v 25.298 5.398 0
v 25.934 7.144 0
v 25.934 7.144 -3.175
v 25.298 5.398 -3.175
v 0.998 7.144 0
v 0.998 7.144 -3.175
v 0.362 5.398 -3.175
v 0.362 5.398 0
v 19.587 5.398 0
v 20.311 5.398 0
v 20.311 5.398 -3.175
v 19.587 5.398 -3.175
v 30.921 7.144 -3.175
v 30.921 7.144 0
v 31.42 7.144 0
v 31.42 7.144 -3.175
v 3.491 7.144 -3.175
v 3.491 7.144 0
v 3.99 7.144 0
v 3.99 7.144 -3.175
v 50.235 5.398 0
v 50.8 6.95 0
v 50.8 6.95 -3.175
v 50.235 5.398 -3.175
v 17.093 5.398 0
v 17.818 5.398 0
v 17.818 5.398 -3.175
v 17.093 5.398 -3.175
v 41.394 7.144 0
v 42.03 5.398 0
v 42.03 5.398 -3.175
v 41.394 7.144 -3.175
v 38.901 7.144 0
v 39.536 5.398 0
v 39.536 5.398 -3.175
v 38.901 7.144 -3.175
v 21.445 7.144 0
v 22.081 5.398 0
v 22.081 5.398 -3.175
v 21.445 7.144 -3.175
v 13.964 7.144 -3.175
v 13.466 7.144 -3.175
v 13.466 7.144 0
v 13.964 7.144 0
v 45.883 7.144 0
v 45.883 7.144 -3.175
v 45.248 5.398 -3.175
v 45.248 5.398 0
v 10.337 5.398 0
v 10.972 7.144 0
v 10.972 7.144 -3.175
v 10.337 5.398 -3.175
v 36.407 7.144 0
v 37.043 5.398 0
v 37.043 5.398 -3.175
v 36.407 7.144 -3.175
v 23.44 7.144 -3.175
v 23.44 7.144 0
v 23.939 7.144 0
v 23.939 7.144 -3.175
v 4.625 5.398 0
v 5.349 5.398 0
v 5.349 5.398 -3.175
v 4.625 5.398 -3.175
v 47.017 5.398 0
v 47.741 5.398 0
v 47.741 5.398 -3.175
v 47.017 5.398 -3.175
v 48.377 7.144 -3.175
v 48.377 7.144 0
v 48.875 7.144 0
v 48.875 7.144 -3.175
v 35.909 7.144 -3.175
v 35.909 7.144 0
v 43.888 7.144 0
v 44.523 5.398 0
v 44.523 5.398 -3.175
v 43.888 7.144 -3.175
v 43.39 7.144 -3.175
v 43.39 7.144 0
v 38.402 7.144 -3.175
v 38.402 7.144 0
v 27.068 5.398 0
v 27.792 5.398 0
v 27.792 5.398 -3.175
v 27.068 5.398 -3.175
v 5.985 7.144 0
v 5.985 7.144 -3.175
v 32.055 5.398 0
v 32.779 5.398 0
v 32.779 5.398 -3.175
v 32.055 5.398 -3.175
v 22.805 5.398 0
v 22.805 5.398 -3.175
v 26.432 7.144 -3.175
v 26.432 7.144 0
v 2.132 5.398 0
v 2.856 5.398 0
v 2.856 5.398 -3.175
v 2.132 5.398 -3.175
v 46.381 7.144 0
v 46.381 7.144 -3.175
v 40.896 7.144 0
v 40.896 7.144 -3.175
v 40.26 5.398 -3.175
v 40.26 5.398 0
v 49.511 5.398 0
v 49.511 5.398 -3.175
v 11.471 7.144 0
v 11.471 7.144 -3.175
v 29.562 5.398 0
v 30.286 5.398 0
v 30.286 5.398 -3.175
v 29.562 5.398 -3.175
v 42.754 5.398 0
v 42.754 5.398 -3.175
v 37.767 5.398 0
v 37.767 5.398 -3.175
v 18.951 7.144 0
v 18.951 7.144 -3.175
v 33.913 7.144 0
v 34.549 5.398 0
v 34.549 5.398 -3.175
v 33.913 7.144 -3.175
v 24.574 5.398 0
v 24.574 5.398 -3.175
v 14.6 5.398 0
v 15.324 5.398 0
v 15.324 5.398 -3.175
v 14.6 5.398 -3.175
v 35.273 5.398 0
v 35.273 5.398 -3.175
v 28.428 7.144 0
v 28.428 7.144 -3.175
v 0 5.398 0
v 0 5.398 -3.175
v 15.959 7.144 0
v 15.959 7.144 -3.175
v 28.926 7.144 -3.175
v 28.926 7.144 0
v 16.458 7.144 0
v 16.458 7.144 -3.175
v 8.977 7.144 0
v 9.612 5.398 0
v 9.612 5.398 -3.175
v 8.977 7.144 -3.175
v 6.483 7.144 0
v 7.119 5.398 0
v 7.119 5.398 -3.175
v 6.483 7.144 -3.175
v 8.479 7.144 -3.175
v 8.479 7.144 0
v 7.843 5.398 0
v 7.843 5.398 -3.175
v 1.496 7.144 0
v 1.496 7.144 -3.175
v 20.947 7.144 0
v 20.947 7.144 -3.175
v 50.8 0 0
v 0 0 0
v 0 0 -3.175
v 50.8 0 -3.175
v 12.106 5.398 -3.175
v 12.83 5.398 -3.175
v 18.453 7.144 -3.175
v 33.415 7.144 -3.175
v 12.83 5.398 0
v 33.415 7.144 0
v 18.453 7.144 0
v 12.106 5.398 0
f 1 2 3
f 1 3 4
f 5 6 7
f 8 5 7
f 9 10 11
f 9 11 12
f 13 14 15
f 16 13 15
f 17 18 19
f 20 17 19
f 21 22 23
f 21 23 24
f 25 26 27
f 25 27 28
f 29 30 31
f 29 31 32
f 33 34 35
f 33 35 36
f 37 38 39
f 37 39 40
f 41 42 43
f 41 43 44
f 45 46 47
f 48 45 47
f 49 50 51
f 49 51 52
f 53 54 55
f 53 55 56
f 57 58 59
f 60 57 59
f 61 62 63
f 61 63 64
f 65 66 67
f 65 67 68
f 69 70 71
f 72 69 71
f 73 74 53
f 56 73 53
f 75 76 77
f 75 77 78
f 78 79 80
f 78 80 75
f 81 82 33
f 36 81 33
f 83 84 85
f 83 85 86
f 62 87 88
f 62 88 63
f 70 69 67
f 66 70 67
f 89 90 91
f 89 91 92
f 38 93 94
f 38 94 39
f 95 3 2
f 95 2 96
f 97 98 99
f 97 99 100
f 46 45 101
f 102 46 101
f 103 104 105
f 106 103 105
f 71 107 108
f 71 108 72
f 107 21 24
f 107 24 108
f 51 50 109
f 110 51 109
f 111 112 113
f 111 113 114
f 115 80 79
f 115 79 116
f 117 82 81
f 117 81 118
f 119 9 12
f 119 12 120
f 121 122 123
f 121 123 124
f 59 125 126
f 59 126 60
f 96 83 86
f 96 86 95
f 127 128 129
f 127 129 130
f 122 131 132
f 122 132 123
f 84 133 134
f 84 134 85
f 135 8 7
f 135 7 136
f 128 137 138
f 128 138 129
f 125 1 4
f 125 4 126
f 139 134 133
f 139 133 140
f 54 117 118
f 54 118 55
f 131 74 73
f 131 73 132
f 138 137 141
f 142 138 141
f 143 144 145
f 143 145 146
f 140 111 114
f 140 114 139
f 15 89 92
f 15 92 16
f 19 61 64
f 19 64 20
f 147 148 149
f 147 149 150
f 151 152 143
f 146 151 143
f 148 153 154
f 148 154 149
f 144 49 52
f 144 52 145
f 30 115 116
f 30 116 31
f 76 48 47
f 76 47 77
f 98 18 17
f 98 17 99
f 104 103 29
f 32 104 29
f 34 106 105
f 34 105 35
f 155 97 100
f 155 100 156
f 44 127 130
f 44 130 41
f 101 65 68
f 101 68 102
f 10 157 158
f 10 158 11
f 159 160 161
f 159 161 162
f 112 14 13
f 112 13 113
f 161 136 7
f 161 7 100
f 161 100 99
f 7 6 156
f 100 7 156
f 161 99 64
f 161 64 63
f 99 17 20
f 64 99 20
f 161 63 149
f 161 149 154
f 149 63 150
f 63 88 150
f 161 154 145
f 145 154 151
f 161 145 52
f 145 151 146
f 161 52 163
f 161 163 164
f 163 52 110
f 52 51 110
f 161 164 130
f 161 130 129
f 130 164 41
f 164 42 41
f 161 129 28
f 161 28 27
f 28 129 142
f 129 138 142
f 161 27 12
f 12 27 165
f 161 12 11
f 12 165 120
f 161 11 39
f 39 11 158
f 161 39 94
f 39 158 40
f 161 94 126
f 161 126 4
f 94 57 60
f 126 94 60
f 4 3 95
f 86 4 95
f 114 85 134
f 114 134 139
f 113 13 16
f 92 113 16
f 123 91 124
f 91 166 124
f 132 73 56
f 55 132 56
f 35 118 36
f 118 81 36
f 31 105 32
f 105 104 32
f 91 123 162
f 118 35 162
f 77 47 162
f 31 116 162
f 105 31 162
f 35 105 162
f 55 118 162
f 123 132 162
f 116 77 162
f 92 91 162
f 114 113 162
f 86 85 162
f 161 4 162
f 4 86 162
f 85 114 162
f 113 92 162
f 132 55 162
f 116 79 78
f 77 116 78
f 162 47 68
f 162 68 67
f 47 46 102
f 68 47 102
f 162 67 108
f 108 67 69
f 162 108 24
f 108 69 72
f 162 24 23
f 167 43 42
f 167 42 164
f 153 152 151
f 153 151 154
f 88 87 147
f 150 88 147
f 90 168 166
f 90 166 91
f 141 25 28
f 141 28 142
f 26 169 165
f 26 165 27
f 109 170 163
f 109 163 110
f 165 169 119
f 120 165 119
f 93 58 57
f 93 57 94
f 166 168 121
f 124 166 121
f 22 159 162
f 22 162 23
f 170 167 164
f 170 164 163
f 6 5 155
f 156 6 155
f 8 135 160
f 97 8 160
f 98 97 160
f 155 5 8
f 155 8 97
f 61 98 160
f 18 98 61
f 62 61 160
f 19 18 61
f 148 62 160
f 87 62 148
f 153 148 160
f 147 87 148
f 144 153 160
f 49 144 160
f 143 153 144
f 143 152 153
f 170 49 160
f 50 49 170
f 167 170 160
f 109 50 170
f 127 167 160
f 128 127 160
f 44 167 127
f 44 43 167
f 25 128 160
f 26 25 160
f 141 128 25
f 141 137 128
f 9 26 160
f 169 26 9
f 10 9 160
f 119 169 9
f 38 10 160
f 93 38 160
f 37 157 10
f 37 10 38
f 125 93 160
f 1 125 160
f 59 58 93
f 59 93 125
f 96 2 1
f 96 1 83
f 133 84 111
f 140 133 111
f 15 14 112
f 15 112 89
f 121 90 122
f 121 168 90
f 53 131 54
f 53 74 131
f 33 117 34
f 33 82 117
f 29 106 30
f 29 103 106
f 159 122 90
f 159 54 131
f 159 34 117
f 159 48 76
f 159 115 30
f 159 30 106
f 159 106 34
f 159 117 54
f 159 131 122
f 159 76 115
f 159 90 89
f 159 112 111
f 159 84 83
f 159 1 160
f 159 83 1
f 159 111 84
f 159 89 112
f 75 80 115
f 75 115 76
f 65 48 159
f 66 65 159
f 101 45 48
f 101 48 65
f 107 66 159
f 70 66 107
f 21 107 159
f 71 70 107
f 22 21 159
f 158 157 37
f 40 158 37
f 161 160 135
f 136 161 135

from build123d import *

# Parameters (mm, degrees)
BLANKSKE_W        = 50.8
BLANKSKE_H        = 7.14375
BLANK_DEPTH       = 3.175
TOOTHCUTSIM_DEPTH = 52.397994018
TEETHCUTS_COUNT   = 21
TEETHCUTS_PITCH   = 2.493639166


with BuildPart() as part:
    # BlankSke → Blank (new body)
    with BuildSketch(Plane.XY):
        with Locations((25.4, 3.571875)):
            Rectangle(BLANKSKE_W, BLANKSKE_H)
    extrude(amount=-BLANK_DEPTH)

    # TooCutSkeSim → ToothCutSim (cut, through all)
    with BuildSketch(Plane.XY):
        Polygon((0.362072143, 5.3975), (-0.362072143, 5.3975), (-1.006900009, 7.16915), (1.006900009, 7.16915), align=None)
    toothcutsim = extrude(amount=-TOOTHCUTSIM_DEPTH, mode=Mode.SUBTRACT)

    # TeethCuts: ToothCutSim ×21
    with Locations(*[(i * TEETHCUTS_PITCH, 0, 0) for i in range(1, TEETHCUTS_COUNT)]):
        add(toothcutsim, mode=Mode.SUBTRACT)


solid = part.part
